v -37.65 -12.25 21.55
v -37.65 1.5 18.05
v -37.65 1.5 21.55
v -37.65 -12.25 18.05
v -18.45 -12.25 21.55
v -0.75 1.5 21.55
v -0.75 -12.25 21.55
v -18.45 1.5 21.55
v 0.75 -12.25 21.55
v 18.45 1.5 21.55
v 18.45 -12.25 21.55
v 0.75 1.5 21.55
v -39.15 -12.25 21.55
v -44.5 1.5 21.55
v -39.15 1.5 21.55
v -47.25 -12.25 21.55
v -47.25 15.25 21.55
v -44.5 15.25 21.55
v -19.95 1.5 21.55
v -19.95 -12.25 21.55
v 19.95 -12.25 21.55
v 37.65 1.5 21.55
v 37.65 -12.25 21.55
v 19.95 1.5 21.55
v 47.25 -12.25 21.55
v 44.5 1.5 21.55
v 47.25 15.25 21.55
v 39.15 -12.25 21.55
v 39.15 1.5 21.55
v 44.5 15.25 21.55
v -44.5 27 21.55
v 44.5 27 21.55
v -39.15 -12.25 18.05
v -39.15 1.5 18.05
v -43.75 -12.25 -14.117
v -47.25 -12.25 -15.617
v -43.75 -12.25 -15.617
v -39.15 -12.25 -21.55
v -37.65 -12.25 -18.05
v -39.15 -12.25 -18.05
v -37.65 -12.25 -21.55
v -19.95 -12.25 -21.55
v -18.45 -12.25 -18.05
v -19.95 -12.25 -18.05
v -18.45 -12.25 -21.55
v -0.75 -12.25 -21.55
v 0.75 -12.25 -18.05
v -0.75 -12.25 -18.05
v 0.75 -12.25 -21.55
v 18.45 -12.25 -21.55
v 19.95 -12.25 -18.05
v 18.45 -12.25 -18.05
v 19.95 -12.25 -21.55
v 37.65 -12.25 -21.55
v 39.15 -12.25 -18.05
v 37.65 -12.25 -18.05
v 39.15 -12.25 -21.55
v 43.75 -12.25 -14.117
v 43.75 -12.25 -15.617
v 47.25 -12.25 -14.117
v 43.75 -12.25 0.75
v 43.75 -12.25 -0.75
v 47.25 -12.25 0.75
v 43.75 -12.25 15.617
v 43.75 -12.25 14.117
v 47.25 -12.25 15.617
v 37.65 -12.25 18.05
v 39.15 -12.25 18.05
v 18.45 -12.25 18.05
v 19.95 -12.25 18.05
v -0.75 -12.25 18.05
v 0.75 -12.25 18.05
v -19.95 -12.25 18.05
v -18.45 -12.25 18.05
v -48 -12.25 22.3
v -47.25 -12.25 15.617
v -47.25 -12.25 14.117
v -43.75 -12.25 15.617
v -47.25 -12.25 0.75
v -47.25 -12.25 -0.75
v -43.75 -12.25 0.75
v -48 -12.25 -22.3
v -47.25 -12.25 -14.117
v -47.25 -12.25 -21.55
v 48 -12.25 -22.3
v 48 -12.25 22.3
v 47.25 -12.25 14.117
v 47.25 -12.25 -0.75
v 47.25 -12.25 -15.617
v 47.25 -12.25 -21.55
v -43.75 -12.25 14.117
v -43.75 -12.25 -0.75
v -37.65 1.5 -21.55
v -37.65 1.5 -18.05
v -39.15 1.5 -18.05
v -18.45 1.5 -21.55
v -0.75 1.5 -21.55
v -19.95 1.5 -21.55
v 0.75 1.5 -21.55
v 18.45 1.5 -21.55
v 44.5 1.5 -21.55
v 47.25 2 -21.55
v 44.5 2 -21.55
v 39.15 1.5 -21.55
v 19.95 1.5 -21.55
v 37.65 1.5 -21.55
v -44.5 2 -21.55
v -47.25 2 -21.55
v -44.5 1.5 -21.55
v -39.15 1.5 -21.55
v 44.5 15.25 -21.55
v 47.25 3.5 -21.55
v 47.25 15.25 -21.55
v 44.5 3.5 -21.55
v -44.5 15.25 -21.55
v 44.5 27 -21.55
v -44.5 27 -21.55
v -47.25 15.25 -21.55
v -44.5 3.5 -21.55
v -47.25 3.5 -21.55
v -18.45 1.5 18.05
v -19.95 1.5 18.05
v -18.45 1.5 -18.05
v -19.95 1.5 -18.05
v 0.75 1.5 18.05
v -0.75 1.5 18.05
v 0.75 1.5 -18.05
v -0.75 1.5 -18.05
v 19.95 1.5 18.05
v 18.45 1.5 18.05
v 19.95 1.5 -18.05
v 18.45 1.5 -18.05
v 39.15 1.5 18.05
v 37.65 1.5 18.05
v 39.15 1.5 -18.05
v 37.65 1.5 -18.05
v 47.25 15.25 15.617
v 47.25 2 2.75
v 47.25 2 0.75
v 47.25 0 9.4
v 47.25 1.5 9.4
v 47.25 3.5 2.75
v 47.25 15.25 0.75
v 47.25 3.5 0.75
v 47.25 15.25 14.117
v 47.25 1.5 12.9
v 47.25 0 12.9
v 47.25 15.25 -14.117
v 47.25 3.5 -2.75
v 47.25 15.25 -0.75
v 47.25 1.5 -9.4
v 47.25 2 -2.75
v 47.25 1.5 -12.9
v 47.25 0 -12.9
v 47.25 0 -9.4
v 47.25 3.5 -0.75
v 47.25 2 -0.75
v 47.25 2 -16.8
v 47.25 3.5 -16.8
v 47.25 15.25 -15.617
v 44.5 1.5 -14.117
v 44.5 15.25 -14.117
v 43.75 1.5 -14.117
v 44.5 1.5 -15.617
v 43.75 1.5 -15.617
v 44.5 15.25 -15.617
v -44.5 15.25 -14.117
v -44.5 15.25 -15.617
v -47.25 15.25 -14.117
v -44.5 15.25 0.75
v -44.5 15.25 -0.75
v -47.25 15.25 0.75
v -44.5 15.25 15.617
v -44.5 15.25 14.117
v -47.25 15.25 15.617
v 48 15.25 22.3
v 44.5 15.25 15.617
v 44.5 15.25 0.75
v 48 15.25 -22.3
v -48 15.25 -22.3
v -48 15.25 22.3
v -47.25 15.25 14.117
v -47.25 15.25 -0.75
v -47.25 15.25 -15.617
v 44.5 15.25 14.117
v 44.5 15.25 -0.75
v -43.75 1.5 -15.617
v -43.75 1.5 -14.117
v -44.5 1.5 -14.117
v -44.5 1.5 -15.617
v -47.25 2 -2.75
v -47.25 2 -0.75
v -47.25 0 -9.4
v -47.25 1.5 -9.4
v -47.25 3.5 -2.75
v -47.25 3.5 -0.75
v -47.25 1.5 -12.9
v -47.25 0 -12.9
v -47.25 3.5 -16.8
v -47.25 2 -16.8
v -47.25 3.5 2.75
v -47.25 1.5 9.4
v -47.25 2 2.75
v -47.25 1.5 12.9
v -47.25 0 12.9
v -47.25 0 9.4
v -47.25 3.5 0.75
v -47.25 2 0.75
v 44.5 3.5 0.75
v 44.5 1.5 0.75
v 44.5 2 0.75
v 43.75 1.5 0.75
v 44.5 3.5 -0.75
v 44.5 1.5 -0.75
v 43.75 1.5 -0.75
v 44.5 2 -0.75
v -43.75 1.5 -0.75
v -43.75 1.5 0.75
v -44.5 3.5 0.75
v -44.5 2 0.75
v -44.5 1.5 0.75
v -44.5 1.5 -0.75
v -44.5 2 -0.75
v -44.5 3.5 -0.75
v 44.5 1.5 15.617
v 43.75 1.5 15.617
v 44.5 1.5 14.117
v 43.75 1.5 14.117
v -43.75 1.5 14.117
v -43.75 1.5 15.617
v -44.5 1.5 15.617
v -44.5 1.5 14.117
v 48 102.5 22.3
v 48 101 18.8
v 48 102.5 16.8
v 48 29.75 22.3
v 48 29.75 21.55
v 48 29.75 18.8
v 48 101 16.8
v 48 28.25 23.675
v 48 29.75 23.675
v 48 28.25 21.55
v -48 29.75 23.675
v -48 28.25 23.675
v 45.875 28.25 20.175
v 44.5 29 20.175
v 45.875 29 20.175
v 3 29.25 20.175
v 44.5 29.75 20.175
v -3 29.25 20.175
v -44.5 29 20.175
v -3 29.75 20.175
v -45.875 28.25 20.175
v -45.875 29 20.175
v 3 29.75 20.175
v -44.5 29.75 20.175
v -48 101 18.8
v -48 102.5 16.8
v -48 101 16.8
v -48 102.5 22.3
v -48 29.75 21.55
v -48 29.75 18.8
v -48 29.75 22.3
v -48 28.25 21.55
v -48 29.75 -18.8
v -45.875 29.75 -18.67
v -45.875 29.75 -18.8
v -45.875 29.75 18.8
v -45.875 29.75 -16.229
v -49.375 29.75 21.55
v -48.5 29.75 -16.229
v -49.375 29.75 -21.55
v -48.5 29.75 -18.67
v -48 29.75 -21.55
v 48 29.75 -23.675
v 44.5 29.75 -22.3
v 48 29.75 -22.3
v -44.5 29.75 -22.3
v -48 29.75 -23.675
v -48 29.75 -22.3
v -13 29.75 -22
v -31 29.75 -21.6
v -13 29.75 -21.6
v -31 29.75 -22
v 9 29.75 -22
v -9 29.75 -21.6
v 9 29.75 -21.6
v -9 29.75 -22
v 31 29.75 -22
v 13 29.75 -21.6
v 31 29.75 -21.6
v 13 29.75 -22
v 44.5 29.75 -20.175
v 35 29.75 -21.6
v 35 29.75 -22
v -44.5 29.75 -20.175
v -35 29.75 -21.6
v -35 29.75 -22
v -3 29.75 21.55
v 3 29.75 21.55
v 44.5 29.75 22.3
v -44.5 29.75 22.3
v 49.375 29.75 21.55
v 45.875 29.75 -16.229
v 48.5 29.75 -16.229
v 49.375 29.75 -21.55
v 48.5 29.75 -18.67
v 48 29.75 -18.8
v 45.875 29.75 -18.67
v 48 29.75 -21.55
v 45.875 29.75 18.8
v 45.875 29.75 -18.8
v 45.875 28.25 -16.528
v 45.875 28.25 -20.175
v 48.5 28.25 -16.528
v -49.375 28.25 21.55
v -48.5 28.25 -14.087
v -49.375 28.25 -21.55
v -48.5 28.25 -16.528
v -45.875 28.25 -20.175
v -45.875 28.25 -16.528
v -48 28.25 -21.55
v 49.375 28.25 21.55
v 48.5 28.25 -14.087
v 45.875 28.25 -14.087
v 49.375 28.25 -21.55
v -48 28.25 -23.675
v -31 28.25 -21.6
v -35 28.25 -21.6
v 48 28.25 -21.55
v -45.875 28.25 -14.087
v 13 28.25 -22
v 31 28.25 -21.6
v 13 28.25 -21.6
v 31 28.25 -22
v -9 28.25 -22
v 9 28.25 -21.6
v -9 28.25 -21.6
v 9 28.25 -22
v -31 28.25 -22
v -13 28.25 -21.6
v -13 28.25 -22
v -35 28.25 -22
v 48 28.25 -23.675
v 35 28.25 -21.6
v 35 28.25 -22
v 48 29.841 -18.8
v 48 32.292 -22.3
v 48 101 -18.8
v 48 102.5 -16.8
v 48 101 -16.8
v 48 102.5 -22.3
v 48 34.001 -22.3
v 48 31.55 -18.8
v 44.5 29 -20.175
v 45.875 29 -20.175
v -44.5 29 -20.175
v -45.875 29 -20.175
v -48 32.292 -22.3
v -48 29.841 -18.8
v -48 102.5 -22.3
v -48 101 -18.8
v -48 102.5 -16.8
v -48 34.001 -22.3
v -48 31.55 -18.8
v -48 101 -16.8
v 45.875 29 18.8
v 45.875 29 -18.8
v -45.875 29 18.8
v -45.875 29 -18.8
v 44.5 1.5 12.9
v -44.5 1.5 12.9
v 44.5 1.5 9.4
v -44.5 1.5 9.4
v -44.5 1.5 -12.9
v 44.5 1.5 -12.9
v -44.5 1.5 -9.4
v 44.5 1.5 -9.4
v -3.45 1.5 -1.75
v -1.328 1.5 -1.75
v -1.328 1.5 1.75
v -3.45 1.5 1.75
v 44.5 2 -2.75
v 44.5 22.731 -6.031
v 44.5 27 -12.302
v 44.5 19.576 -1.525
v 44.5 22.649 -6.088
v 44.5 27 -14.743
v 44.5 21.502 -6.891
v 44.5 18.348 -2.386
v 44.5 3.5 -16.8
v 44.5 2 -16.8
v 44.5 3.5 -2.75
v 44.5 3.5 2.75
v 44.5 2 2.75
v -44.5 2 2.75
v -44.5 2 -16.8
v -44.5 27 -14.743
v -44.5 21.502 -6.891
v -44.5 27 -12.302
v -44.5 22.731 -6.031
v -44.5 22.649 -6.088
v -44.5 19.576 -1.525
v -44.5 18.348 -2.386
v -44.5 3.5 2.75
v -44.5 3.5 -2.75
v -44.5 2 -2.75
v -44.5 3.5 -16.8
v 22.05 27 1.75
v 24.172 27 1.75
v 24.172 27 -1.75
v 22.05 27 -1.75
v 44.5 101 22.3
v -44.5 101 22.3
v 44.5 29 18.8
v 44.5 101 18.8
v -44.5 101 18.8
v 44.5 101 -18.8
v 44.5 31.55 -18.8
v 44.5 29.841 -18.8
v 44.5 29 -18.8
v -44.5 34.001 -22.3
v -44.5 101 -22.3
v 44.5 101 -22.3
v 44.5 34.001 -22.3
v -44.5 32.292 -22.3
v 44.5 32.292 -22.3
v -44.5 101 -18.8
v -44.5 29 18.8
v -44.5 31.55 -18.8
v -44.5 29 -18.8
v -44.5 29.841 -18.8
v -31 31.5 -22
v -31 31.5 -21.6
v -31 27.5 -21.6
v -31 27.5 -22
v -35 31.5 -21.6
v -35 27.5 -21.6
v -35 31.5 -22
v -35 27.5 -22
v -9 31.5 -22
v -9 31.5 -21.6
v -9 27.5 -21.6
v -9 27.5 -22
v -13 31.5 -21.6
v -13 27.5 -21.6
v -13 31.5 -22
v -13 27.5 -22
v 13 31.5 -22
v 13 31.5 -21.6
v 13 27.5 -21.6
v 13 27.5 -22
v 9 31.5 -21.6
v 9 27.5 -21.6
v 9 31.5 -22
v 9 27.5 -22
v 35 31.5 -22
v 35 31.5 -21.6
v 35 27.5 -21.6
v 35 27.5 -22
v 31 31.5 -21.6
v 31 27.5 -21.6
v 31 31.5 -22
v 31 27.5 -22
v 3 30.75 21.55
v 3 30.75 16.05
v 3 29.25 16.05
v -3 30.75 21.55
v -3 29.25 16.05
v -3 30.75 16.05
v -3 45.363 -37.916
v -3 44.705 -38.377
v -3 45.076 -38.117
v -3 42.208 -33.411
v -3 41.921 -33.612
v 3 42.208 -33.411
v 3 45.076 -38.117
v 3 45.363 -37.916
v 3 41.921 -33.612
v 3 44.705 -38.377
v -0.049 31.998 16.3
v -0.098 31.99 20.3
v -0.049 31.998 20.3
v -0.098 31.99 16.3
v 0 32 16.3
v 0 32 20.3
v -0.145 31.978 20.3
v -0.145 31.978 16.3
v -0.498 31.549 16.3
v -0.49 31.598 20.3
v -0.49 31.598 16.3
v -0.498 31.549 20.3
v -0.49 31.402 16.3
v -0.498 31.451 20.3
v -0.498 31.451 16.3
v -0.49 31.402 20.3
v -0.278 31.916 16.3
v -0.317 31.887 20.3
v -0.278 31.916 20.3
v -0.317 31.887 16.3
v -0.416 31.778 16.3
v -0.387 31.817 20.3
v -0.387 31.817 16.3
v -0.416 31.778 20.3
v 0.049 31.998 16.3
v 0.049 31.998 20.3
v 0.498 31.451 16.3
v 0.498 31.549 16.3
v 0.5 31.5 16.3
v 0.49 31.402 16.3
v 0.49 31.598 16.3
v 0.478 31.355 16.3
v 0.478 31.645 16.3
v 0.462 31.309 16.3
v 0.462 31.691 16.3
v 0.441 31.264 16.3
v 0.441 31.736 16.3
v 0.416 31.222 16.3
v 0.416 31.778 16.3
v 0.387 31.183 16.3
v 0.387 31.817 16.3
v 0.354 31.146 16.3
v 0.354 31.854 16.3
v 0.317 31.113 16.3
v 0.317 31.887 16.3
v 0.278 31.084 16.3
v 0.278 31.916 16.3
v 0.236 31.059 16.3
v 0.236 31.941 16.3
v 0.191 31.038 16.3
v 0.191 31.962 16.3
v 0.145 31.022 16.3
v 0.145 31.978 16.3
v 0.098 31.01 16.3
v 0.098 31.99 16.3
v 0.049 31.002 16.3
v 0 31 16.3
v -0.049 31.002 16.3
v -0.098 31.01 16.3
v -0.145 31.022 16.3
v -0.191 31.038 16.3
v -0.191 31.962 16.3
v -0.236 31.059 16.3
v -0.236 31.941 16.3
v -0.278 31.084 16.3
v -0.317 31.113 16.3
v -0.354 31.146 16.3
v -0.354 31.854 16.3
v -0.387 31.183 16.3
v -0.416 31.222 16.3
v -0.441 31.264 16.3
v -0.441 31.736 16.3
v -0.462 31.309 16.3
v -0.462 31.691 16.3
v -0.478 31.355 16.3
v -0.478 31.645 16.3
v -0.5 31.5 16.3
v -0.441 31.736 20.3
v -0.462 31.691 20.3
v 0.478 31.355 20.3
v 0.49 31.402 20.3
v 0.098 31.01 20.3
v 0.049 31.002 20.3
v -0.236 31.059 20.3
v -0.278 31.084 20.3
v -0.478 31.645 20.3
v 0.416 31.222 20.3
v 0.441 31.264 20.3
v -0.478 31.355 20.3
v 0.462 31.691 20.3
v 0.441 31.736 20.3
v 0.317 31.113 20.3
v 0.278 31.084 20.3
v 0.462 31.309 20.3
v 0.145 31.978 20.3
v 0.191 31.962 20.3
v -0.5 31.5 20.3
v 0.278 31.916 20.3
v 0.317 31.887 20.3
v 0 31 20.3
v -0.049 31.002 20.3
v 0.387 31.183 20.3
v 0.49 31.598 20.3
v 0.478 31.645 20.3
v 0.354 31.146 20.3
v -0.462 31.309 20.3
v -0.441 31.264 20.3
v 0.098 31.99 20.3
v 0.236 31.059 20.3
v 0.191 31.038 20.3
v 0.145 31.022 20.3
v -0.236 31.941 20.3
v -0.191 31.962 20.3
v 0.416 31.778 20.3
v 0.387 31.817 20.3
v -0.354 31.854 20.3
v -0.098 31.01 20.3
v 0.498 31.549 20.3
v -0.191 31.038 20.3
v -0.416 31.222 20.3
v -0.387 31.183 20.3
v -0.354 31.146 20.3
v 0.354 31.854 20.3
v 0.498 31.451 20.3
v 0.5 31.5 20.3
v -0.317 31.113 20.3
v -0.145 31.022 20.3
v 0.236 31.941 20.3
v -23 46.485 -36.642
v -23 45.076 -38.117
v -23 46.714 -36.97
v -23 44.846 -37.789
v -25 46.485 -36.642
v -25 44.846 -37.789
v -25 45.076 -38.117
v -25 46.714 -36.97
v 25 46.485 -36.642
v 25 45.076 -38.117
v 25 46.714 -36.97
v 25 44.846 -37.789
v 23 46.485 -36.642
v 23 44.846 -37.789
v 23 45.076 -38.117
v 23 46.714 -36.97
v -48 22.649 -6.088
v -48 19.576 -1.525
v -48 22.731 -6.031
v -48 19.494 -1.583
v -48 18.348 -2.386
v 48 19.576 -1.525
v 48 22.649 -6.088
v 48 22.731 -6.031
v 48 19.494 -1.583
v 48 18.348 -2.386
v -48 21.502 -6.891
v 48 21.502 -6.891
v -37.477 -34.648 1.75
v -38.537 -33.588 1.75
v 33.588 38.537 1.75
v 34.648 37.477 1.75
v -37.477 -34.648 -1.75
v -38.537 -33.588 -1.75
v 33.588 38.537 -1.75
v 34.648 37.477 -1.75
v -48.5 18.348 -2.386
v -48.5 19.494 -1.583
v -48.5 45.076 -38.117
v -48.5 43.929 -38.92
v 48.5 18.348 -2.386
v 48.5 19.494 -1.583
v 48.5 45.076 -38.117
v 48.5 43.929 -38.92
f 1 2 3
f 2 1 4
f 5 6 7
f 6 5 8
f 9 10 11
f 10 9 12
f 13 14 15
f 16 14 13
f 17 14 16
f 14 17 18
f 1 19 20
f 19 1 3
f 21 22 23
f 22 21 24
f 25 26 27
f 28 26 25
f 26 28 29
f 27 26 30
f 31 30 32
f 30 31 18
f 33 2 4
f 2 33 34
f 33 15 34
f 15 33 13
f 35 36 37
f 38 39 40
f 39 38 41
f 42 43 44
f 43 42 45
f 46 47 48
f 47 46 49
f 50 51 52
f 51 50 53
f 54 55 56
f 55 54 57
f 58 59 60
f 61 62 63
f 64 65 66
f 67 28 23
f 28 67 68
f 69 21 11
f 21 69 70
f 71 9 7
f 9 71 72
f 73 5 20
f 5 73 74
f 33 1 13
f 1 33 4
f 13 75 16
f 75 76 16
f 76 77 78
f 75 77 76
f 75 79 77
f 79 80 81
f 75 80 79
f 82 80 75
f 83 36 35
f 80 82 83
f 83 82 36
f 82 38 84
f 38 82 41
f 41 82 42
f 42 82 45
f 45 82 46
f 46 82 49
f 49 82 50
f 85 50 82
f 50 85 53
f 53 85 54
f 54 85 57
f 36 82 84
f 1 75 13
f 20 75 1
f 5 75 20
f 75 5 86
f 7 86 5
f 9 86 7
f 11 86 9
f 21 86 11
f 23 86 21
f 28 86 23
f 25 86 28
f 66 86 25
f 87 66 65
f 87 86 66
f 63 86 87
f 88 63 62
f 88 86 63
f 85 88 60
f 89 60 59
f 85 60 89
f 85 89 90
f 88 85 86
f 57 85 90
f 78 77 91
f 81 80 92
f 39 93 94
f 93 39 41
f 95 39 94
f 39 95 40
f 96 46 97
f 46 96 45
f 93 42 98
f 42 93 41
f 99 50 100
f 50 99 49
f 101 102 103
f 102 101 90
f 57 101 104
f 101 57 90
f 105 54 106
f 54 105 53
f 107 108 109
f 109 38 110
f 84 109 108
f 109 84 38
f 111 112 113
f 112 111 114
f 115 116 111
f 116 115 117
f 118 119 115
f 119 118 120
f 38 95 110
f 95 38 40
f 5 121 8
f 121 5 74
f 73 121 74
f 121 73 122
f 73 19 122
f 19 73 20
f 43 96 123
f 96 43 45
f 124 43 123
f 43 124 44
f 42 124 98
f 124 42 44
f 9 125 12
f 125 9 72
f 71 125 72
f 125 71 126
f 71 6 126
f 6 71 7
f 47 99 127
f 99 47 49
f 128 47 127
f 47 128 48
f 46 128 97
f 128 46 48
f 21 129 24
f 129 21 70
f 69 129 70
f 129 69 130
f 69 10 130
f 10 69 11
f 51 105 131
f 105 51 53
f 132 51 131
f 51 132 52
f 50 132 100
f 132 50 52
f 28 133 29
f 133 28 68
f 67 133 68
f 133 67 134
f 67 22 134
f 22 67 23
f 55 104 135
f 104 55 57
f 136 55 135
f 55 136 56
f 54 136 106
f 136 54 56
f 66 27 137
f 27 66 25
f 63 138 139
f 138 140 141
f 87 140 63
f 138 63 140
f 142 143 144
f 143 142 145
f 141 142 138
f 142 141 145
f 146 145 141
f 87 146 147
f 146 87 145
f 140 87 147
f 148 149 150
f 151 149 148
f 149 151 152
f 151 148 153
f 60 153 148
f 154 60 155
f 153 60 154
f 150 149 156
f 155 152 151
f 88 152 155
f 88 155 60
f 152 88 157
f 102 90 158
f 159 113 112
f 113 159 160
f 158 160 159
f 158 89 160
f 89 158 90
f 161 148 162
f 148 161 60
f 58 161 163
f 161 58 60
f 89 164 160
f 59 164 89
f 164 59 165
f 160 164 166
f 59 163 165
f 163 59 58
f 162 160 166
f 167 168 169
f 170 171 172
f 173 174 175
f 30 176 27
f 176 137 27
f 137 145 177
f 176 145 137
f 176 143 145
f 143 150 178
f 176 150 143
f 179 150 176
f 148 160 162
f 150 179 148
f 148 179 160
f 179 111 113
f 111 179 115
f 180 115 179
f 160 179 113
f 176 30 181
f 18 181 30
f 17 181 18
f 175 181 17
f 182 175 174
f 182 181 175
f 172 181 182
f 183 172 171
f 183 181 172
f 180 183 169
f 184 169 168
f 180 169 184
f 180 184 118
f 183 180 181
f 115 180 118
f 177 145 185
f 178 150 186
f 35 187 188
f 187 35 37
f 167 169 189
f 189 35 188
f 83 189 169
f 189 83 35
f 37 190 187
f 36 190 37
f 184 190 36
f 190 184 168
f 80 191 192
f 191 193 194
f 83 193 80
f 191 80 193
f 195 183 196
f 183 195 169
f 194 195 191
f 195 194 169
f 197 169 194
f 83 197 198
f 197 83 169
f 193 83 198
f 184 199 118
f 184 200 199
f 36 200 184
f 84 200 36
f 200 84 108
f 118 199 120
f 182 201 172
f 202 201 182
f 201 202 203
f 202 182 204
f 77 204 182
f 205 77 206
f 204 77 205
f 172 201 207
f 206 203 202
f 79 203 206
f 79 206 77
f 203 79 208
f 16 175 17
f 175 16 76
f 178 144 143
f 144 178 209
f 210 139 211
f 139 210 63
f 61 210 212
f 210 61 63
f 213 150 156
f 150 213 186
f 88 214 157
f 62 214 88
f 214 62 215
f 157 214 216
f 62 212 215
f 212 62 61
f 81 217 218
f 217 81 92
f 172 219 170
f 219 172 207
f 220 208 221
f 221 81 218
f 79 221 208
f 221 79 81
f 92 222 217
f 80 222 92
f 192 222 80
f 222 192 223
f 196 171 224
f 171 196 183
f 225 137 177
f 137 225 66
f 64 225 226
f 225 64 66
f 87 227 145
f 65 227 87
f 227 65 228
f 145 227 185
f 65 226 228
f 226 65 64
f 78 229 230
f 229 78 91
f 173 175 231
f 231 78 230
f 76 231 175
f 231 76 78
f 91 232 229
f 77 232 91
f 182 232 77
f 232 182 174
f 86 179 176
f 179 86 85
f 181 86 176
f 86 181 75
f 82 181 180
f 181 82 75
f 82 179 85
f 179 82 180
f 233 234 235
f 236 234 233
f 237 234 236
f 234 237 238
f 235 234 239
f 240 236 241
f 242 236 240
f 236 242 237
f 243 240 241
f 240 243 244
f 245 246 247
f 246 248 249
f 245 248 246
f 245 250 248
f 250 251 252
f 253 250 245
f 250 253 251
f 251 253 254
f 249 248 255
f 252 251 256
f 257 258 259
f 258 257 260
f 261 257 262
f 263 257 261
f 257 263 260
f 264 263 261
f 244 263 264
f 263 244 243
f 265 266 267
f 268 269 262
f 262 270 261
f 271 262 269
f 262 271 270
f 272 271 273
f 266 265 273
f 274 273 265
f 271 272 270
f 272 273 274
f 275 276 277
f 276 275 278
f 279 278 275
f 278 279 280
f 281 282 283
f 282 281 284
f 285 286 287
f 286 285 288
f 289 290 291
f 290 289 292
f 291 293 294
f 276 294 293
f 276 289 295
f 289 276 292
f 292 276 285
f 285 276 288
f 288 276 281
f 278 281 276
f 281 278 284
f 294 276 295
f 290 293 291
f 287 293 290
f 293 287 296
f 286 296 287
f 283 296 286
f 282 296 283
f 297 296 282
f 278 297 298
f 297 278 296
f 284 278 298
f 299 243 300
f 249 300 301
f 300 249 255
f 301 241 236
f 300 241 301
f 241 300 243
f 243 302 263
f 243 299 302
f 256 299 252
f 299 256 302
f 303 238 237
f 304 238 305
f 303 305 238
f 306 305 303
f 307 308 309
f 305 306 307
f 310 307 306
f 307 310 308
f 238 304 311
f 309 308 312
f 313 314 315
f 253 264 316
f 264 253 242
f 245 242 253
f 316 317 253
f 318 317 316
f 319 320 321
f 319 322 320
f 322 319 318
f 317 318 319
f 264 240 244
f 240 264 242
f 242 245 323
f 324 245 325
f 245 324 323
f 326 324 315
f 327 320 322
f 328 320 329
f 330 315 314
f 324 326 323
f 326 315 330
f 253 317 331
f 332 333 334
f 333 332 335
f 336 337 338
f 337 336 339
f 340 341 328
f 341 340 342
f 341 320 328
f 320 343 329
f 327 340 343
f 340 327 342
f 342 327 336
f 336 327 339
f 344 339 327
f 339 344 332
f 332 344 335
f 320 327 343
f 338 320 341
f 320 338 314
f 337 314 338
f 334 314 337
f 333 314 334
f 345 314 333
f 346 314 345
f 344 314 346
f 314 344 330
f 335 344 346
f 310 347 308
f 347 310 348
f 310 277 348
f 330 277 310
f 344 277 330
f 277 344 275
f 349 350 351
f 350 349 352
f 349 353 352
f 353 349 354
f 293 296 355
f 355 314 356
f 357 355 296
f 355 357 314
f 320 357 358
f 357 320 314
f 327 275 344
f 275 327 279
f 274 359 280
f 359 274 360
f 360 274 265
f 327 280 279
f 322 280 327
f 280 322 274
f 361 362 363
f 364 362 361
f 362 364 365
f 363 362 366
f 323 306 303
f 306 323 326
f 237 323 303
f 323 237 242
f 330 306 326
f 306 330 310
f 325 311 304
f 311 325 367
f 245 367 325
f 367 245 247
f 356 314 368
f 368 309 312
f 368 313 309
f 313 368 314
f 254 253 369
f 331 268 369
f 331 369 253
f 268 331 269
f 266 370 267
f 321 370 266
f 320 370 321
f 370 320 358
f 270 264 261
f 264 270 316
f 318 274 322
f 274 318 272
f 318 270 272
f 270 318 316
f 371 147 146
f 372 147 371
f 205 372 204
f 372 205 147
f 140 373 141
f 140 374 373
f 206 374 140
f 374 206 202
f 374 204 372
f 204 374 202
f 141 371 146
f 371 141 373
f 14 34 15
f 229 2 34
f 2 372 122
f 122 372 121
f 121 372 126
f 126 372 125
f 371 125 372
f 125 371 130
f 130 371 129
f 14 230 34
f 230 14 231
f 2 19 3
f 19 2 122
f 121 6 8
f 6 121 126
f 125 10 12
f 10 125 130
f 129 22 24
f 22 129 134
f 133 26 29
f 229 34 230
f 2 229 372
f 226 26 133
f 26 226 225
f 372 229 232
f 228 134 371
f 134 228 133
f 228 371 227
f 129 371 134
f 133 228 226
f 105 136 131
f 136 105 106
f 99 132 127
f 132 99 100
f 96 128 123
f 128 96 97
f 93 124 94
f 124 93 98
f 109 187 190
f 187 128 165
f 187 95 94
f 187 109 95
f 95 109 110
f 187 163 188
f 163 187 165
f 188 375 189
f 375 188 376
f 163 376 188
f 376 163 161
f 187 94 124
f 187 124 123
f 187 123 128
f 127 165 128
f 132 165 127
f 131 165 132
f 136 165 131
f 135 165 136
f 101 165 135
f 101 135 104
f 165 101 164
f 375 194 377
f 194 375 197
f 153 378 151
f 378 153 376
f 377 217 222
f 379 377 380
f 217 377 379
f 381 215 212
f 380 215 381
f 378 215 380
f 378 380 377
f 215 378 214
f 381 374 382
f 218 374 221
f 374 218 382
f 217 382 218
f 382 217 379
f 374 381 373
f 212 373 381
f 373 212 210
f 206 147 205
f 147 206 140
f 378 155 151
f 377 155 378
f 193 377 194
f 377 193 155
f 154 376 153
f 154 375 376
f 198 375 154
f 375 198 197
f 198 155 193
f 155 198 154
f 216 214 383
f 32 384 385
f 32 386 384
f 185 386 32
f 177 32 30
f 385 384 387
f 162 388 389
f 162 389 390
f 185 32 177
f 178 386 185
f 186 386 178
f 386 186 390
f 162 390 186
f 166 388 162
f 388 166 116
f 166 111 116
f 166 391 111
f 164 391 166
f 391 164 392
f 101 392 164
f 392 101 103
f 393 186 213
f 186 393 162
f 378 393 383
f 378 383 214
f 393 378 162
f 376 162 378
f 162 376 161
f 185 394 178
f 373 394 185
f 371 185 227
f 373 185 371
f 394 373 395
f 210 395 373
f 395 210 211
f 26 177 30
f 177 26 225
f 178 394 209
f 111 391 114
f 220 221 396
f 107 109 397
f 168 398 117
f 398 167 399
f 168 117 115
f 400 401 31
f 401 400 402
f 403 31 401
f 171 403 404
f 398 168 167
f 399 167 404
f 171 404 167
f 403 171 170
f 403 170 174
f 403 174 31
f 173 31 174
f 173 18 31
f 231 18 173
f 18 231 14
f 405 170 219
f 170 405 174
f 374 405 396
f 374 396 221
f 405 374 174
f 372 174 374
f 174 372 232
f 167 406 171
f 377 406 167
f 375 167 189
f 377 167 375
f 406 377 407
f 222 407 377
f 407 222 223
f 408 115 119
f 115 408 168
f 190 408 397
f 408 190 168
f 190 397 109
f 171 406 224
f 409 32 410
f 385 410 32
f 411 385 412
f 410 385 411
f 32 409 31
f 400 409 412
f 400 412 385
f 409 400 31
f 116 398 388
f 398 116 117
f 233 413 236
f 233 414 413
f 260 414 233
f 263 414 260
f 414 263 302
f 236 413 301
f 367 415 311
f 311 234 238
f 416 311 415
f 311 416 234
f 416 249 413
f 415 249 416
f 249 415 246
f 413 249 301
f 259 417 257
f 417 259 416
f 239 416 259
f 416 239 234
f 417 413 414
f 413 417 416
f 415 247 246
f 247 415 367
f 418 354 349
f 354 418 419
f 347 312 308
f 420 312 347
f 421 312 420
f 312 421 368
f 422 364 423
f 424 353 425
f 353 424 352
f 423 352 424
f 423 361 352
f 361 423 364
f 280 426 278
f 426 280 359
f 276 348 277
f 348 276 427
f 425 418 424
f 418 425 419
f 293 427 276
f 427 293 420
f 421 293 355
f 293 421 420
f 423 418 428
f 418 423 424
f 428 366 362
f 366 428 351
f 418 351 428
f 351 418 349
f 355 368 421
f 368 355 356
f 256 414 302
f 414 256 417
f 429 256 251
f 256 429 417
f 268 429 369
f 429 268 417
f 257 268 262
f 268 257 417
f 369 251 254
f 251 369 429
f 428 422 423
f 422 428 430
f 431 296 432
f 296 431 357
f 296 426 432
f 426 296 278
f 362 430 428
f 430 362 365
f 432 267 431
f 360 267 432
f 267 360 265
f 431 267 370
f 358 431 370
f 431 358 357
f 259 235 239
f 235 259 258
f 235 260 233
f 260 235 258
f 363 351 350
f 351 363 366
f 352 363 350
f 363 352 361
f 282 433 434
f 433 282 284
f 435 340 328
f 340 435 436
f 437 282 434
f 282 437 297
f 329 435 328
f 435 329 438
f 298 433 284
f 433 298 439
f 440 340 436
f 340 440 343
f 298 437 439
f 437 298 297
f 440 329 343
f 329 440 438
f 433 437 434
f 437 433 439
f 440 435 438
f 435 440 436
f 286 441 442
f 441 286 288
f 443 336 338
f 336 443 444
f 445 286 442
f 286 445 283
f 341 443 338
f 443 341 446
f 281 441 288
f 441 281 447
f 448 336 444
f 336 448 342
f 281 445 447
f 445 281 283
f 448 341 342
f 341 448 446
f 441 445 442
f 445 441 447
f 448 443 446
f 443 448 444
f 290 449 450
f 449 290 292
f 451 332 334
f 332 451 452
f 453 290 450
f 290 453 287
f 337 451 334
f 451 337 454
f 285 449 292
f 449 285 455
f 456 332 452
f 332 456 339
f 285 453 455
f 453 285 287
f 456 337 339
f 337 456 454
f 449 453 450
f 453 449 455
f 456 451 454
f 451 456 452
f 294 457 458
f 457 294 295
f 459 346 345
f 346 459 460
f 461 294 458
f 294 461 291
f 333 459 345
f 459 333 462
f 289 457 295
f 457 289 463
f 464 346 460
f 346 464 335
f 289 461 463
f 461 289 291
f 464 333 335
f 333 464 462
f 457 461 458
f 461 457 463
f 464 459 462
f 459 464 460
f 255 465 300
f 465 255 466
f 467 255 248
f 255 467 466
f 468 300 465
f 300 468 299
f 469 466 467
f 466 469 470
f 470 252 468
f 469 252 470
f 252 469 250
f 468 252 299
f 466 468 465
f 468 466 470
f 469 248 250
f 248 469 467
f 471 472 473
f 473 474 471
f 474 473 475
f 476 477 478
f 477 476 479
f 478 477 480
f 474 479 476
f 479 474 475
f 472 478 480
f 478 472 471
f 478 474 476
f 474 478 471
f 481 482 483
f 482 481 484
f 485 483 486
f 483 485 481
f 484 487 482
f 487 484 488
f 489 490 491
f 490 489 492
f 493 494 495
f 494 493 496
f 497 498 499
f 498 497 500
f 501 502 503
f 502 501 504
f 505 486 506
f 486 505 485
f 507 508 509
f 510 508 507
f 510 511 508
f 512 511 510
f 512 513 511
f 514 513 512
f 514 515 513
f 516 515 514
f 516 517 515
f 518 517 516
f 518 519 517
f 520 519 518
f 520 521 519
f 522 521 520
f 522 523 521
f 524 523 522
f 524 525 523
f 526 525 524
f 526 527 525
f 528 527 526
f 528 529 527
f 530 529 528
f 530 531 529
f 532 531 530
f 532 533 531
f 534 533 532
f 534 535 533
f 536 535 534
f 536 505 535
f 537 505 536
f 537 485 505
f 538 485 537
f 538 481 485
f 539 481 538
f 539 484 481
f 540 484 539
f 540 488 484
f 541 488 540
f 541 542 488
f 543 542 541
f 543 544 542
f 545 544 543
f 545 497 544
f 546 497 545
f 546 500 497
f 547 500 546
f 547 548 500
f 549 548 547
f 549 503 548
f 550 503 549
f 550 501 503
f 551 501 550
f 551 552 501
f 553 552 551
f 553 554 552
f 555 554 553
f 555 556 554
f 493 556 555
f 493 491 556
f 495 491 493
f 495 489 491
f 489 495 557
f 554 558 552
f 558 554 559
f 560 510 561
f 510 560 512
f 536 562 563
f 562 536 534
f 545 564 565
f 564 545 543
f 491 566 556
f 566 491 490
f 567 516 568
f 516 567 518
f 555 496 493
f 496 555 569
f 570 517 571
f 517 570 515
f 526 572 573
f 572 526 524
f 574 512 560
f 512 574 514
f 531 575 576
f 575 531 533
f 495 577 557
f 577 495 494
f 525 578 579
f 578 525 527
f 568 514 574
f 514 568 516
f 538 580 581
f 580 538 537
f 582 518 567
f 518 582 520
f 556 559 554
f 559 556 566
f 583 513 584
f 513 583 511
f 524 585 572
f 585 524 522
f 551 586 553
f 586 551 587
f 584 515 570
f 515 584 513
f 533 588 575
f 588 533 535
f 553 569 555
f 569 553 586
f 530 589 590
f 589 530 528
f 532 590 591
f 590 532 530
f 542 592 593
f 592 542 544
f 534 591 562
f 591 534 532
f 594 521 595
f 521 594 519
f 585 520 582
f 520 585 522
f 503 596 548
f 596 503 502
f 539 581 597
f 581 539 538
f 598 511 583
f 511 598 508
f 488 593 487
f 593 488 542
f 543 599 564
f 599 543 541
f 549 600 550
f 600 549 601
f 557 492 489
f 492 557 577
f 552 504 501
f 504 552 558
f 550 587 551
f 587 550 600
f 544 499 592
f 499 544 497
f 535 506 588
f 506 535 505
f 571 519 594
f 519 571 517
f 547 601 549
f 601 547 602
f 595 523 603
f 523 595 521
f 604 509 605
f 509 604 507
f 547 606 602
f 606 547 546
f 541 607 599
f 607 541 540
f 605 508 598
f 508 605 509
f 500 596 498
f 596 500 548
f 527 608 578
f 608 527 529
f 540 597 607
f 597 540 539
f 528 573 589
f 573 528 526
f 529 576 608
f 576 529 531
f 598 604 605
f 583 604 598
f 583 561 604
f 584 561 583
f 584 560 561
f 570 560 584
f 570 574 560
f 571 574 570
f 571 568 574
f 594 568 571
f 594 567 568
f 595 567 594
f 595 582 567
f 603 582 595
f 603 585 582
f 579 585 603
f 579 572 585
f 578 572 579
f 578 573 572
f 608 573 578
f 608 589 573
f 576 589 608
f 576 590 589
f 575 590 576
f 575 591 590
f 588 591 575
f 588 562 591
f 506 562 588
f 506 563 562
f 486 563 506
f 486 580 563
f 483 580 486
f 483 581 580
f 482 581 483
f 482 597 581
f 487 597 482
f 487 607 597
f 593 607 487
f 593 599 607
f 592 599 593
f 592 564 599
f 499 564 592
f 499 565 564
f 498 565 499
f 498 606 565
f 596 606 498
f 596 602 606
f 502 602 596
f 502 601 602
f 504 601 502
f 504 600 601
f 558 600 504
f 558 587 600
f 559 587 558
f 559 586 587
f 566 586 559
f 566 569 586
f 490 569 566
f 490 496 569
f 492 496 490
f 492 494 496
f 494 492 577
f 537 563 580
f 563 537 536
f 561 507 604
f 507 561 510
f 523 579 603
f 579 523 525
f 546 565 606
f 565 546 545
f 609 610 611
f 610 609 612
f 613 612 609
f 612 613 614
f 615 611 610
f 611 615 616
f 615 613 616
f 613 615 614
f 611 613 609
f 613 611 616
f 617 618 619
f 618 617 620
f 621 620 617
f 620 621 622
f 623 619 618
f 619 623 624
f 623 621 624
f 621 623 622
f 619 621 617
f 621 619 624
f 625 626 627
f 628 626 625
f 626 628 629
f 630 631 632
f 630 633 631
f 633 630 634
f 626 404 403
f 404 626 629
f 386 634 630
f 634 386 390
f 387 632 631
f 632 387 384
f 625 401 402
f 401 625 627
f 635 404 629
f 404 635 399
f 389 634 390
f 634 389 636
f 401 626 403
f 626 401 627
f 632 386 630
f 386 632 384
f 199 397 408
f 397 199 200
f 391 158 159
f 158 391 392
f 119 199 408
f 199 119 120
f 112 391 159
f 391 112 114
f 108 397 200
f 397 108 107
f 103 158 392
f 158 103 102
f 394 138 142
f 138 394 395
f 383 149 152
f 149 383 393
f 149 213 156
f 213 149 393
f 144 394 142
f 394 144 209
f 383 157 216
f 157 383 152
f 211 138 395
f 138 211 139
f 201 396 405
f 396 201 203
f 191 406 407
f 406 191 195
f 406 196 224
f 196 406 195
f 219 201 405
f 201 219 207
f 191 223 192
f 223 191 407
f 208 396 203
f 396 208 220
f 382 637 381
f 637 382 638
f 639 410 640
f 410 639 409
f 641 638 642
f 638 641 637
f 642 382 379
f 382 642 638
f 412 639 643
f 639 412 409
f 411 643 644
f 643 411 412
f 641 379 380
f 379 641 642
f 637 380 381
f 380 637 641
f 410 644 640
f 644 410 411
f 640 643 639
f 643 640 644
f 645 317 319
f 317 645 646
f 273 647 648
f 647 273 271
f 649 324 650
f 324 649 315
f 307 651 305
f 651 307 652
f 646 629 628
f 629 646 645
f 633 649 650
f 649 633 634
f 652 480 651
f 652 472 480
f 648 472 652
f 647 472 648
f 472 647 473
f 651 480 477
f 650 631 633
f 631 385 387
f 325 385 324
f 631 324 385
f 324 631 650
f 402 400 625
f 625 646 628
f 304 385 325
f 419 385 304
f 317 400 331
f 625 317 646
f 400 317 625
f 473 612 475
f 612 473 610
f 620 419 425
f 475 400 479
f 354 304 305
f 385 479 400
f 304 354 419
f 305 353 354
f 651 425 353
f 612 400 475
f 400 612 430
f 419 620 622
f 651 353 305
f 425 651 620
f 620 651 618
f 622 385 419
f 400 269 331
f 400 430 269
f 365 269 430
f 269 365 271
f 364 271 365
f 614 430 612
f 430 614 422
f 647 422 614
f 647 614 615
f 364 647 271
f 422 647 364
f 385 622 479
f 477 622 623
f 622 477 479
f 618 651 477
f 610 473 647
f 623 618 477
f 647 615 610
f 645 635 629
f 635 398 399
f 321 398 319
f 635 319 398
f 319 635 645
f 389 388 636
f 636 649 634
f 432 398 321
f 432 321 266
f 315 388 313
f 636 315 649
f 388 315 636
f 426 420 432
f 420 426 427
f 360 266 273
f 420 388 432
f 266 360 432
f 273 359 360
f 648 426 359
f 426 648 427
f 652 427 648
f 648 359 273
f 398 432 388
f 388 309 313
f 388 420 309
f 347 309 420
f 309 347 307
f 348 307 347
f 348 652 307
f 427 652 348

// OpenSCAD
// file: parts/actuator.scad
// =============================================================================
// parts/actuator.scad -- the linear actuator + 2 clevis blocks
// =============================================================================
//
// 12V, 4" stroke, 330 lb. Mounted between the bed's north wall (clevis
// block) and the frame's north rail (clevis block). Tilts with the
// frame on the rail side; fixed on the bed side.

include <../wattplot_params.scad>

module actuator_assembly() {
    hinge_y = bed_rim_h_in + 0.5;
    hinge_z = -bed_outer_W_in/2 + 0.5;
    panel_pivot_x = 0;
    // Clevis block on the bed's north wall (fixed -- doesn't tilt)
    color(col_actuator_default)
    translate([0, bed_rim_h_in + 1.0, bed_outer_W_in/2 - wall_skin_thk_in - actuator_block_wid_in/2])
        cube([actuator_block_length_in, actuator_block_thk_in, actuator_block_wid_in], center=true);
    // Clevis block on the frame's north rail (moves with the frame)
    color(col_actuator_default)
    translate([panel_pivot_x, hinge_y, hinge_z])
        rotate([panel_tilt_deg, 0, 0])
        translate([0, panel_clearance_in + 1.0, -bed_outer_W_in/2 + actuator_block_wid_in/2])
            cube([actuator_block_length_in, actuator_block_thk_in, actuator_block_wid_in], center=true);
    // The actuator body itself: visualized as a cylinder between
    // the two clevis blocks. Real actuator is a 12V worm-drive
    // unit; we model it as a cylinder for visual scale only.
    color(col_actuator_default)
    translate([0, bed_rim_h_in + 1.0 + 1.5, bed_outer_W_in/2 - wall_skin_thk_in - actuator_block_wid_in/2 - 0.5])
        rotate([0, 0, 90])
            cylinder(h=actuator_stroke_in, d=1.0, center=true);
}

col_actuator_default = [0.40, 0.40, 0.45];

if (is_undef($use_only)) {
    $fn = 64;
    actuator_assembly();
}
// file: parts/frame.scad
// =============================================================================
// parts/frame.scad -- 2x6 perimeter around the panel + 2x4 diagonal brace + 6 clamps
// =============================================================================
//
// Tilts with the panel. Hinged on the south; the diagonal brace carries
// the load at 90 deg tilt (not used at 35 deg but modeled for
// completeness). The 6 aluminum mid-clamps grip the panel frame.

include <../wattplot_params.scad>

module frame_assembly(show_clamps=true) {
    hinge_y = bed_rim_h_in + 0.5;
    hinge_z = -bed_outer_W_in/2 + 0.5;
    panel_pivot_x = 0;
    color(col_frame_default)
    translate([panel_pivot_x, hinge_y, hinge_z])
        rotate([panel_tilt_deg, 0, 0])
            // Long rails (X axis, panel length)
            translate([0, panel_clearance_in + frame_long_rail_thk_in/2, bed_outer_W_in/2 - frame_long_rail_wid_in/2])
                cube([frame_long_rail_length_in, frame_long_rail_thk_in, frame_long_rail_wid_in], center=true);
            translate([0, panel_clearance_in + frame_long_rail_thk_in/2, -bed_outer_W_in/2 + frame_long_rail_wid_in/2])
                cube([frame_long_rail_length_in, frame_long_rail_thk_in, frame_long_rail_wid_in], center=true);
            // Cross rails (Z axis, between long rails)
            translate([ bed_outer_L_in/2 - frame_cross_rail_length_in/2, panel_clearance_in + frame_cross_rail_thk_in/2, 0])
                cube([frame_cross_rail_length_in, frame_cross_rail_thk_in, frame_cross_rail_wid_in], center=true);
            translate([-bed_outer_L_in/2 + frame_cross_rail_length_in/2, panel_clearance_in + frame_cross_rail_thk_in/2, 0])
                cube([frame_cross_rail_length_in, frame_cross_rail_thk_in, frame_cross_rail_wid_in], center=true);
            // Diagonal brace: 2x4, butts into the long rails
            // (only structural at 90 deg tilt, but always there)
            rotate([0, 0, 45])
                translate([0, panel_clearance_in + frame_brace_thk_in/2, 0])
                    cube([frame_brace_length_in, frame_brace_thk_in, frame_brace_wid_in], center=true);
    
    if (show_clamps)
    color(col_hinge_default)
    translate([panel_pivot_x, hinge_y, hinge_z])
        rotate([panel_tilt_deg, 0, 0])
        for (i = [0:panel_clamps_per_long_rail-1]) {
            x = -bed_outer_L_in/4 + i * (bed_outer_L_in / 2) /
                  max(1, panel_clamps_per_long_rail - 1);
            translate([x, panel_clearance_in + panel_thk_in + panel_clamp_height_in/2, bed_outer_W_in/2 - panel_clamp_thk_in/2])
                cube([panel_clamp_length_in, panel_clamp_height_in, panel_clamp_thk_in], center=true);
            translate([x, panel_clearance_in + panel_thk_in + panel_clamp_height_in/2, -bed_outer_W_in/2 + panel_clamp_thk_in/2])
                cube([panel_clamp_length_in, panel_clamp_height_in, panel_clamp_thk_in], center=true);
        }
        for (i = [0:panel_clamps_per_cross_rail-1]) {
            z = 0;
            translate([ bed_outer_L_in/2 - panel_clamp_thk_in/2, panel_clearance_in + panel_thk_in + panel_clamp_height_in/2, z])
                cube([panel_clamp_thk_in, panel_clamp_height_in, panel_clamp_length_in], center=true);
            translate([-bed_outer_L_in/2 + panel_clamp_thk_in/2, panel_clearance_in + panel_thk_in + panel_clamp_height_in/2, z])
                cube([panel_clamp_thk_in, panel_clamp_height_in, panel_clamp_length_in], center=true);
        }
}

col_frame_default = [0.90, 0.90, 0.88];
col_hinge_default = [0.60, 0.60, 0.65];

if (is_undef($use_only)) {
    $fn = 64;
    frame_assembly();
}
// file: parts/panel.scad
// =============================================================================
// parts/panel.scad -- the LONGi Hi-MO X10 620W (or any other preset)
// =============================================================================
//
// Tilts around the hinge axis (X axis at Y = bed_rim_h_in + 0.5,
// Z = -bed_outer_W_in/2 + 0.5).

include <../wattplot_params.scad>

module panel_assembly() {
    hinge_y = bed_rim_h_in + 0.5;
    hinge_z = -bed_outer_W_in/2 + 0.5;
    panel_pivot_x = 0;
    color(col_panel_default)
    translate([panel_pivot_x, hinge_y, hinge_z])
        rotate([panel_tilt_deg, 0, 0])   // tilt around the X axis
            translate([0, panel_clearance_in + panel_thk_in/2, bed_outer_W_in/2 - panel_W_in/2])
                cube([panel_L_in, panel_thk_in, panel_W_in], center=true);
}

col_panel_default = [0.20, 0.30, 0.55];   // LONGi blue

if (is_undef($use_only)) {
    $fn = 64;
    panel_assembly();
}
// file: parts/hinges.scad
// =============================================================================
// parts/hinges.scad -- the 4 butt hinges + 1/2" steel rod (the pivot axis)
// =============================================================================

include <../wattplot_params.scad>

module hinges_assembly() {
    // Hinge axis Y position: top of the south wall, +1" up for the
    // hinge knuckle. The frame's south rail sits on this.
    hinge_y = bed_rim_h_in + 0.5;
    hinge_z = -bed_outer_W_in/2 + 0.5;  // 0.5" inboard of the wall outer face
    // Hinge leaves (just visual placeholders; the real hinge is
    // a 4"x4"x1/8" steel leaf with a 0.5" knuckle)
    for (i = [0:hinge_count-1]) {
        x = -hinge_spacing_in * (hinge_count-1) / 2 + i * hinge_spacing_in;
        color(col_hinge_default)
        translate([x, hinge_y, hinge_z])
            cube([hinge_leaf_in, hinge_leaf_in, 0.4], center=true);
    }
    // The 1/2" rod (visualized as a thin cylinder along the hinge axis)
    color(col_hinge_default)
    translate([0, hinge_y, hinge_z])
        rotate([0, 90, 0])
            cylinder(h=bed_outer_L_in, d=hinge_pin_d_in, center=true);
}

col_hinge_default = [0.60, 0.60, 0.65];

if (is_undef($use_only)) {
    $fn = 64;
    hinges_assembly();
}
// file: parts/posts.scad
// =============================================================================
// parts/posts.scad -- the 4 corner posts + the 2 panel rails on top
// =============================================================================

include <../wattplot_params.scad>

module posts_assembly() {
    // The 4 posts at the bed corners (outside the wall thickness)
    color(col_post_default)
    post( bed_outer_L_in/2 - post_thk_in/2,  bed_outer_W_in/2 - post_thk_in/2);
    color(col_post_default)
    post( bed_outer_L_in/2 - post_thk_in/2, -bed_outer_W_in/2 + post_thk_in/2);
    color(col_post_default)
    post(-bed_outer_L_in/2 + post_thk_in/2,  bed_outer_W_in/2 - post_thk_in/2);
    color(col_post_default)
    post(-bed_outer_L_in/2 + post_thk_in/2, -bed_outer_W_in/2 + post_thk_in/2);
    
    // Panel rails: 2x6 PT DF on top of the post tops, parallel to
    // the bed long axis. These carry the panel + frame.
    color(col_frame_default)
    translate([0, bed_rim_h_in + post_height_in + post_rail_thk_in/2,  bed_outer_W_in/2 - post_rail_wid_in/2])
        cube([bed_outer_L_in, post_rail_thk_in, post_rail_wid_in], center=true);
    color(col_frame_default)
    translate([0, bed_rim_h_in + post_height_in + post_rail_thk_in/2, -bed_outer_W_in/2 + post_rail_wid_in/2])
        cube([bed_outer_L_in, post_rail_thk_in, post_rail_wid_in], center=true);
}

// Single-post helper. Use posts_assembly() for the full set.
module post(x, z) {
    color(col_post_default)
    translate([x, bed_rim_h_in + post_height_in/2, z])
        cube([post_thk_in, post_height_in, post_thk_in], center=true);
}

col_post_default  = [0.70, 0.55, 0.40];
col_frame_default = [0.90, 0.90, 0.88];   // 2x6 painted

if (is_undef($use_only)) {
    $fn = 64;
    posts_assembly();
}
// file: parts/bed.scad
// =============================================================================
// parts/bed.scad -- the planter bed (walls + cleats + header + skids + soil)
// =============================================================================
//
// Self-contained part module. Include wattplot_params.scad for the
// dimensions; render with `use <bed.scad>` to compose into an
// assembly. Color and visibility gates are passed in by the parent
// (wattplot.scad).
//
// Coordinate system (matches the canonical model):
//   X = bed length (south -> north)
//   Y = up
//   Z = bed width (east -> west)

include <../wattplot_params.scad>

module bed_assembly(show_soil=true) {
    // The 4 walls: long (N/S) on the X axis, short (E/W) on Z.
    // Y = wall_h_in. Walls are thin (skin_thk) boards.
    // South wall = the hinge side.
    // North wall = the strut / actuator-mount side.
    
    // Long walls (X axis, run the full bed length)
    color(col_bed_skin_default)
    translate([0, bed_skid_h_in,  bed_outer_W_in/2 - wall_skin_thk_in/2])
        cube([bed_outer_L_in, bed_wall_h_in, wall_skin_thk_in], center=true);
    color(col_bed_skin_default)
    translate([0, bed_skid_h_in, -bed_outer_W_in/2 + wall_skin_thk_in/2])
        cube([bed_outer_L_in, bed_wall_h_in, wall_skin_thk_in], center=true);
    
    // Short walls (Z axis, between the long walls)
    color(col_bed_skin_default)
    translate([ bed_outer_L_in/2 - wall_skin_thk_in/2, bed_skid_h_in, 0])
        cube([wall_skin_thk_in, bed_wall_h_in, bed_inner_W_in], center=true);
    color(col_bed_skin_default)
    translate([-bed_outer_L_in/2 + wall_skin_thk_in/2, bed_skid_h_in, 0])
        cube([wall_skin_thk_in, bed_wall_h_in, bed_inner_W_in], center=true);
    
    // Cleats: vertical 2x4s, evenly spaced (>=24" o.c. per design
    // rule #3). 5 per long wall, 3 per short wall.
    color(col_bed_cleat_default)
    for (i = [0:wall_cleats_long-1]) {
        x = -bed_outer_L_in/2 + bed_outer_L_in * (i + 0.5) / wall_cleats_long;
        translate([x, bed_skid_h_in,  bed_outer_W_in/2 - wall_skin_thk_in - wall_cleat_wid_in/2])
            cube([wall_cleat_thk_in, bed_wall_h_in, wall_cleat_wid_in], center=true);
        translate([x, bed_skid_h_in, -bed_outer_W_in/2 + wall_skin_thk_in + wall_cleat_wid_in/2])
            cube([wall_cleat_thk_in, bed_wall_h_in, wall_cleat_wid_in], center=true);
    }
    color(col_bed_cleat_default)
    for (i = [0:wall_cleats_short-1]) {
        z = -bed_outer_W_in/2 + bed_outer_W_in * (i + 0.5) / wall_cleats_short;
        translate([ bed_outer_L_in/2 - wall_skin_thk_in - wall_cleat_wid_in/2, bed_skid_h_in, z])
            cube([wall_cleat_wid_in, bed_wall_h_in, wall_cleat_thk_in], center=true);
        translate([-bed_outer_L_in/2 + wall_skin_thk_in + wall_cleat_wid_in/2, bed_skid_h_in, z])
            cube([wall_cleat_wid_in, bed_wall_h_in, wall_cleat_thk_in], center=true);
    }
    
    // Header: 2x4 cedar on its wide face, on top of every planter wall
    color(col_bed_skin_default)
    translate([0, bed_rim_h_in,  bed_outer_W_in/2 - wall_skin_thk_in/2])
        cube([bed_outer_L_in, wall_header_thk_in, wall_header_wid_in], center=true);
    color(col_bed_skin_default)
    translate([0, bed_rim_h_in, -bed_outer_W_in/2 + wall_skin_thk_in/2])
        cube([bed_outer_L_in, wall_header_thk_in, wall_header_wid_in], center=true);
    color(col_bed_skin_default)
    translate([ bed_outer_L_in/2 - wall_skin_thk_in/2, bed_rim_h_in, 0])
        cube([wall_header_wid_in, wall_header_thk_in, bed_inner_W_in], center=true);
    color(col_bed_skin_default)
    translate([-bed_outer_L_in/2 + wall_skin_thk_in/2, bed_rim_h_in, 0])
        cube([wall_header_wid_in, wall_header_thk_in, bed_inner_W_in], center=true);
    
    // Skids: 2x4 PT DF laid on wide side, 8 ft long, under the bed
    color(col_skid_default)
    translate([0, bed_skid_h_in/2,  bed_outer_W_in/4])
        cube([bed_outer_L_in, bed_skid_h_in, bed_skid_side_in], center=true);
    color(col_skid_default)
    translate([0, bed_skid_h_in/2, -bed_outer_W_in/4])
        cube([bed_outer_L_in, bed_skid_h_in, bed_skid_side_in], center=true);
    
    // Soil fill (visual placeholder -- not structural)
    if (show_soil)
    color(col_soil_default)
    translate([0, bed_skid_h_in + bed_soil_fill_in/2, 0])
        cube([bed_inner_L_in, bed_soil_fill_in, bed_inner_W_in], center=true);
}

// Default colors for standalone use. The canonical wattplot.scad
// overrides these with its own palette.
col_bed_skin_default = [0.78, 0.55, 0.35];   // cedar
col_bed_cleat_default = [0.85, 0.65, 0.45];
col_skid_default       = [0.55, 0.40, 0.30];   // PT DF
col_soil_default       = [0.40, 0.25, 0.15];   // wet loam

// Render the bed alone when this file is opened directly. The
// if/else avoids a recursive render when used via `use <bed.scad>`.
if (is_undef($use_only)) {
    $fn = 64;
    bed_assembly();
}
// file: wattplot_params.scad
// =============================================================================
// wattplot_params.scad -- mirror of wattplot_params.py
// =============================================================================
//
// DO NOT EDIT THESE NUMBERS WITHOUT UPDATING wattplot_params.py AND
// firmware/tests/test_openscad_params.py.
//
// The Python source of truth is wattplot_params.py at the repo root.
// This file is a hand-maintained mirror so the OpenSCAD models can
// render without Python. A CI test (test_openscad_params.py) reads
// both and fails if any number has drifted.
//
// If you change a value here, change it in wattplot_params.py first
// and update the test expectations in test_openscad_params.py. The
// commit message should reference the param name (e.g.
// "scad: bump POSTS.height_in to 78 for v3.1 storm margin").
//
// All dimensions are in inches. OpenSCAD's $fn controls mesh
// resolution -- 64 gives a clean STL that's about 2 MB at this
// model's complexity.

// ---------- LOCATION ----------
location_latitude  = 33.45;     // Phoenix, AZ
location_longitude = -112.07;
location_elevation_m = 337;
location_design_wind_mph = 115.0; // ASCE 7-22, Risk Cat II 700-yr

// ---------- PLANTER LIMITS ----------
max_planter_L_in = 96.0;          // 8 ft stock, no waste on long rails
max_planter_W_in = 60.0;          // 5 ft (8 ft cross-cut, 2 cross-rails per board)

// ---------- BED (planter, ballasted) ----------
bed_outer_L_in       = 96.0;       // 8 ft (capped at max_planter_L_in)
bed_outer_W_in       = 44.6;       // matches panel width
bed_wall_thk_in      = 0.75;       // 1x6 cedar (3/4" actual)
bed_wall_h_in        = 27.5;       // 5 courses of 1x6 (5.5" actual)
                                   //   wind-sized: SF_overturning 2.55 at 35°
bed_soil_fill_in     = 25.5;       // 2" freeboard below the rim
                                   //   ~60 cu ft = 2.2 cu yd = ~4,000 lb
bed_skid_h_in        = 1.5;        // walls rest on 2x4 footers
bed_skid_side_in     = 3.5;        // 4x nominal

// ---------- BED WALL (1x6 cedar skin over 2x4 cleats) ----------
wall_skin_thk_in   = 0.75;
wall_course_h_in   = 5.5;
wall_courses       = 5;            // 5 x 5.5" = 27.5" wall
wall_cleat_thk_in  = 1.5;          // 2x4 actual
wall_cleat_wid_in  = 3.5;          // 2x4 actual
wall_cleats_long   = 5;            // per long wall
wall_cleats_short  = 3;            // per short wall
wall_header_thk_in = 1.5;         // 2x4 on wide face
wall_header_wid_in = 3.5;

// ---------- POSTS (4x4 PT, 72" tall, walk-under canopy) ----------
post_thk_in  = 3.5;               // 4x4 actual
post_height_in = 72.0;            // 6 ft -- walk-under / reach-under
post_count   = 4;
post_rail_thk_in = 1.5;          // 2x6 on post tops
post_rail_wid_in = 5.5;

// ---------- PANEL (LONGi Hi-MO X10 620W default) ----------
panel_L_in        = 97.0;         // 8.08 ft (overhangs bed 0.5"/side)
panel_W_in        = 44.6;         // 3.72 ft
panel_thk_in      = 1.4;
panel_mass_lb     = 65.0;
panel_wattage     = 620;
panel_tilt_deg    = 35.0;         // 0 = flat, 35 = max (wind-limited)

// ---------- CONTROL (tilt cap + PI setpoint) ----------
control_max_tilt_deg  = 35.0;     // STRUCTURAL cap. See ADR-001.
control_target_current_A = 0.5;
control_hard_current_limit_A = 2.5;

// ---------- FRAME (perimeter around the panel) ----------
frame_long_rail_thk_in   = 1.5;    // 2x6 actual
frame_long_rail_wid_in   = 5.5;
frame_long_rail_length_in = 96.0;  // 8 ft stock, no waste

frame_cross_rail_thk_in   = 1.5;   // 2x6 actual
frame_cross_rail_wid_in   = 5.5;
frame_cross_rail_length_in = 42.0; // 2x6x8ft cut to 42"

frame_brace_thk_in   = 1.5;         // 2x4 actual
frame_brace_wid_in   = 3.5;
frame_brace_length_in = 102.0;     // 2x4x10ft cut to 102"

// ---------- HINGES + PANEL CLAMPS ----------
hinge_leaf_in    = 4.0;            // 4"x4" leaf, 1/2" pin
hinge_pin_d_in    = 0.5;
hinge_count      = 4;
hinge_spacing_in = 22.0;           // 22" o.c.
hinge_rod_length_in = 72.0;        // 1/2" x 72" steel rod (HD)

panel_clamp_length_in = 2.0;       // IronRidge mid-clamp, 35mm channel
panel_clamp_height_in = 2.0;
panel_clamp_thk_in   = 0.4;
panel_clamps_per_long_rail  = 2;
panel_clamps_per_cross_rail = 1;

// ---------- ACTUATOR MOUNT ----------
actuator_block_thk_in  = 1.5;      // 2x6 actual
actuator_block_wid_in  = 5.5;
actuator_block_length_in = 6.0;
actuator_stroke_in     = 4.0;       // 12V linear actuator
actuator_width_in      = 2.0;       // body width (for clearance check)
actuator_height_in     = 2.5;

// ---------- DERIVED (don't change) ----------
// Bed is sized so the panel overhangs the rails by 0.5" per side.
// The panel mid-clamps grip the aluminum frame, not the glass.
bed_inner_L_in = bed_outer_L_in - 2 * post_thk_in;
bed_inner_W_in = bed_outer_W_in - 2 * wall_skin_thk_in;
// Wall sits on top of skid; rim = wall + skid.
bed_rim_h_in = bed_wall_h_in + bed_skid_h_in;
// Panel frame offset above the bed rail (clearance for the clamp).
panel_clearance_in = 2.0;         // 2" above the rail top

// Render resolution: $fn controls segment count for curves.
// 64 gives a clean STL ~2 MB. Lower for fast preview, higher for
// 3D printing.
$fn = 64;
// main file
// =============================================================================
// technical_drawing.scad -- 2D technical drawings for the docs site
// =============================================================================
//
// Renders orthographic projections of the canonical Wattplot assembly
// at three view angles. Exports to PNG for the docs engineering
// section. The camera is positioned via OpenSCAD's --camera flag
// at the make / shell level (this file doesn't bake in a view).
//
// Outputs:
//   docs/renders/wattplot_top_view.png
//   docs/renders/wattplot_side_view.png
//   docs/renders/wattplot_front_view.png
//
// Render:
//   make scad-tech-drawings
//   or (from the repo root):
//     openscad --camera=0,20,0,0,0,0,200 \
//       --projection=o --imgsize=2000,1500 \
//       -o out_top.png models/openscad/technical_drawing.scad
//     openscad --camera=0,0,-20,0,0,90,200 \
//       --projection=o --imgsize=2000,1500 \
//       -o out_side.png models/openscad/technical_drawing.scad
//     openscad --camera=20,0,0,0,90,0,200 \
//       --projection=o --imgsize=2000,1500 \
//       -o out_front.png models/openscad/technical_drawing.scad
//
// The projections are pure (no perspective foreshortening) so
// the docs site can use them as engineering drawings. The view
// is selected at render time by the --camera flag; this file just
// renders the same model in whatever view the camera is pointed
// at.

include <wattplot_params.scad>
use <parts/bed.scad>
use <parts/posts.scad>
use <parts/hinges.scad>
use <parts/panel.scad>
use <parts/frame.scad>
use <parts/actuator.scad>

col_bed_skin   = [0.78, 0.55, 0.35];
col_bed_cleat  = [0.85, 0.65, 0.45];
col_skid       = [0.55, 0.40, 0.30];
col_soil       = [0.40, 0.25, 0.15];
col_post       = [0.70, 0.55, 0.40];
col_frame      = [0.90, 0.90, 0.88];
col_panel      = [0.20, 0.30, 0.55];
col_actuator   = [0.40, 0.40, 0.45];
col_hinge      = [0.60, 0.60, 0.65];

$fn = 32;  // smaller $fn for tech drawings (faster, less detail)

bed_assembly();
posts_assembly();
hinges_assembly();
actuator_assembly();
frame_assembly();
panel_assembly();
